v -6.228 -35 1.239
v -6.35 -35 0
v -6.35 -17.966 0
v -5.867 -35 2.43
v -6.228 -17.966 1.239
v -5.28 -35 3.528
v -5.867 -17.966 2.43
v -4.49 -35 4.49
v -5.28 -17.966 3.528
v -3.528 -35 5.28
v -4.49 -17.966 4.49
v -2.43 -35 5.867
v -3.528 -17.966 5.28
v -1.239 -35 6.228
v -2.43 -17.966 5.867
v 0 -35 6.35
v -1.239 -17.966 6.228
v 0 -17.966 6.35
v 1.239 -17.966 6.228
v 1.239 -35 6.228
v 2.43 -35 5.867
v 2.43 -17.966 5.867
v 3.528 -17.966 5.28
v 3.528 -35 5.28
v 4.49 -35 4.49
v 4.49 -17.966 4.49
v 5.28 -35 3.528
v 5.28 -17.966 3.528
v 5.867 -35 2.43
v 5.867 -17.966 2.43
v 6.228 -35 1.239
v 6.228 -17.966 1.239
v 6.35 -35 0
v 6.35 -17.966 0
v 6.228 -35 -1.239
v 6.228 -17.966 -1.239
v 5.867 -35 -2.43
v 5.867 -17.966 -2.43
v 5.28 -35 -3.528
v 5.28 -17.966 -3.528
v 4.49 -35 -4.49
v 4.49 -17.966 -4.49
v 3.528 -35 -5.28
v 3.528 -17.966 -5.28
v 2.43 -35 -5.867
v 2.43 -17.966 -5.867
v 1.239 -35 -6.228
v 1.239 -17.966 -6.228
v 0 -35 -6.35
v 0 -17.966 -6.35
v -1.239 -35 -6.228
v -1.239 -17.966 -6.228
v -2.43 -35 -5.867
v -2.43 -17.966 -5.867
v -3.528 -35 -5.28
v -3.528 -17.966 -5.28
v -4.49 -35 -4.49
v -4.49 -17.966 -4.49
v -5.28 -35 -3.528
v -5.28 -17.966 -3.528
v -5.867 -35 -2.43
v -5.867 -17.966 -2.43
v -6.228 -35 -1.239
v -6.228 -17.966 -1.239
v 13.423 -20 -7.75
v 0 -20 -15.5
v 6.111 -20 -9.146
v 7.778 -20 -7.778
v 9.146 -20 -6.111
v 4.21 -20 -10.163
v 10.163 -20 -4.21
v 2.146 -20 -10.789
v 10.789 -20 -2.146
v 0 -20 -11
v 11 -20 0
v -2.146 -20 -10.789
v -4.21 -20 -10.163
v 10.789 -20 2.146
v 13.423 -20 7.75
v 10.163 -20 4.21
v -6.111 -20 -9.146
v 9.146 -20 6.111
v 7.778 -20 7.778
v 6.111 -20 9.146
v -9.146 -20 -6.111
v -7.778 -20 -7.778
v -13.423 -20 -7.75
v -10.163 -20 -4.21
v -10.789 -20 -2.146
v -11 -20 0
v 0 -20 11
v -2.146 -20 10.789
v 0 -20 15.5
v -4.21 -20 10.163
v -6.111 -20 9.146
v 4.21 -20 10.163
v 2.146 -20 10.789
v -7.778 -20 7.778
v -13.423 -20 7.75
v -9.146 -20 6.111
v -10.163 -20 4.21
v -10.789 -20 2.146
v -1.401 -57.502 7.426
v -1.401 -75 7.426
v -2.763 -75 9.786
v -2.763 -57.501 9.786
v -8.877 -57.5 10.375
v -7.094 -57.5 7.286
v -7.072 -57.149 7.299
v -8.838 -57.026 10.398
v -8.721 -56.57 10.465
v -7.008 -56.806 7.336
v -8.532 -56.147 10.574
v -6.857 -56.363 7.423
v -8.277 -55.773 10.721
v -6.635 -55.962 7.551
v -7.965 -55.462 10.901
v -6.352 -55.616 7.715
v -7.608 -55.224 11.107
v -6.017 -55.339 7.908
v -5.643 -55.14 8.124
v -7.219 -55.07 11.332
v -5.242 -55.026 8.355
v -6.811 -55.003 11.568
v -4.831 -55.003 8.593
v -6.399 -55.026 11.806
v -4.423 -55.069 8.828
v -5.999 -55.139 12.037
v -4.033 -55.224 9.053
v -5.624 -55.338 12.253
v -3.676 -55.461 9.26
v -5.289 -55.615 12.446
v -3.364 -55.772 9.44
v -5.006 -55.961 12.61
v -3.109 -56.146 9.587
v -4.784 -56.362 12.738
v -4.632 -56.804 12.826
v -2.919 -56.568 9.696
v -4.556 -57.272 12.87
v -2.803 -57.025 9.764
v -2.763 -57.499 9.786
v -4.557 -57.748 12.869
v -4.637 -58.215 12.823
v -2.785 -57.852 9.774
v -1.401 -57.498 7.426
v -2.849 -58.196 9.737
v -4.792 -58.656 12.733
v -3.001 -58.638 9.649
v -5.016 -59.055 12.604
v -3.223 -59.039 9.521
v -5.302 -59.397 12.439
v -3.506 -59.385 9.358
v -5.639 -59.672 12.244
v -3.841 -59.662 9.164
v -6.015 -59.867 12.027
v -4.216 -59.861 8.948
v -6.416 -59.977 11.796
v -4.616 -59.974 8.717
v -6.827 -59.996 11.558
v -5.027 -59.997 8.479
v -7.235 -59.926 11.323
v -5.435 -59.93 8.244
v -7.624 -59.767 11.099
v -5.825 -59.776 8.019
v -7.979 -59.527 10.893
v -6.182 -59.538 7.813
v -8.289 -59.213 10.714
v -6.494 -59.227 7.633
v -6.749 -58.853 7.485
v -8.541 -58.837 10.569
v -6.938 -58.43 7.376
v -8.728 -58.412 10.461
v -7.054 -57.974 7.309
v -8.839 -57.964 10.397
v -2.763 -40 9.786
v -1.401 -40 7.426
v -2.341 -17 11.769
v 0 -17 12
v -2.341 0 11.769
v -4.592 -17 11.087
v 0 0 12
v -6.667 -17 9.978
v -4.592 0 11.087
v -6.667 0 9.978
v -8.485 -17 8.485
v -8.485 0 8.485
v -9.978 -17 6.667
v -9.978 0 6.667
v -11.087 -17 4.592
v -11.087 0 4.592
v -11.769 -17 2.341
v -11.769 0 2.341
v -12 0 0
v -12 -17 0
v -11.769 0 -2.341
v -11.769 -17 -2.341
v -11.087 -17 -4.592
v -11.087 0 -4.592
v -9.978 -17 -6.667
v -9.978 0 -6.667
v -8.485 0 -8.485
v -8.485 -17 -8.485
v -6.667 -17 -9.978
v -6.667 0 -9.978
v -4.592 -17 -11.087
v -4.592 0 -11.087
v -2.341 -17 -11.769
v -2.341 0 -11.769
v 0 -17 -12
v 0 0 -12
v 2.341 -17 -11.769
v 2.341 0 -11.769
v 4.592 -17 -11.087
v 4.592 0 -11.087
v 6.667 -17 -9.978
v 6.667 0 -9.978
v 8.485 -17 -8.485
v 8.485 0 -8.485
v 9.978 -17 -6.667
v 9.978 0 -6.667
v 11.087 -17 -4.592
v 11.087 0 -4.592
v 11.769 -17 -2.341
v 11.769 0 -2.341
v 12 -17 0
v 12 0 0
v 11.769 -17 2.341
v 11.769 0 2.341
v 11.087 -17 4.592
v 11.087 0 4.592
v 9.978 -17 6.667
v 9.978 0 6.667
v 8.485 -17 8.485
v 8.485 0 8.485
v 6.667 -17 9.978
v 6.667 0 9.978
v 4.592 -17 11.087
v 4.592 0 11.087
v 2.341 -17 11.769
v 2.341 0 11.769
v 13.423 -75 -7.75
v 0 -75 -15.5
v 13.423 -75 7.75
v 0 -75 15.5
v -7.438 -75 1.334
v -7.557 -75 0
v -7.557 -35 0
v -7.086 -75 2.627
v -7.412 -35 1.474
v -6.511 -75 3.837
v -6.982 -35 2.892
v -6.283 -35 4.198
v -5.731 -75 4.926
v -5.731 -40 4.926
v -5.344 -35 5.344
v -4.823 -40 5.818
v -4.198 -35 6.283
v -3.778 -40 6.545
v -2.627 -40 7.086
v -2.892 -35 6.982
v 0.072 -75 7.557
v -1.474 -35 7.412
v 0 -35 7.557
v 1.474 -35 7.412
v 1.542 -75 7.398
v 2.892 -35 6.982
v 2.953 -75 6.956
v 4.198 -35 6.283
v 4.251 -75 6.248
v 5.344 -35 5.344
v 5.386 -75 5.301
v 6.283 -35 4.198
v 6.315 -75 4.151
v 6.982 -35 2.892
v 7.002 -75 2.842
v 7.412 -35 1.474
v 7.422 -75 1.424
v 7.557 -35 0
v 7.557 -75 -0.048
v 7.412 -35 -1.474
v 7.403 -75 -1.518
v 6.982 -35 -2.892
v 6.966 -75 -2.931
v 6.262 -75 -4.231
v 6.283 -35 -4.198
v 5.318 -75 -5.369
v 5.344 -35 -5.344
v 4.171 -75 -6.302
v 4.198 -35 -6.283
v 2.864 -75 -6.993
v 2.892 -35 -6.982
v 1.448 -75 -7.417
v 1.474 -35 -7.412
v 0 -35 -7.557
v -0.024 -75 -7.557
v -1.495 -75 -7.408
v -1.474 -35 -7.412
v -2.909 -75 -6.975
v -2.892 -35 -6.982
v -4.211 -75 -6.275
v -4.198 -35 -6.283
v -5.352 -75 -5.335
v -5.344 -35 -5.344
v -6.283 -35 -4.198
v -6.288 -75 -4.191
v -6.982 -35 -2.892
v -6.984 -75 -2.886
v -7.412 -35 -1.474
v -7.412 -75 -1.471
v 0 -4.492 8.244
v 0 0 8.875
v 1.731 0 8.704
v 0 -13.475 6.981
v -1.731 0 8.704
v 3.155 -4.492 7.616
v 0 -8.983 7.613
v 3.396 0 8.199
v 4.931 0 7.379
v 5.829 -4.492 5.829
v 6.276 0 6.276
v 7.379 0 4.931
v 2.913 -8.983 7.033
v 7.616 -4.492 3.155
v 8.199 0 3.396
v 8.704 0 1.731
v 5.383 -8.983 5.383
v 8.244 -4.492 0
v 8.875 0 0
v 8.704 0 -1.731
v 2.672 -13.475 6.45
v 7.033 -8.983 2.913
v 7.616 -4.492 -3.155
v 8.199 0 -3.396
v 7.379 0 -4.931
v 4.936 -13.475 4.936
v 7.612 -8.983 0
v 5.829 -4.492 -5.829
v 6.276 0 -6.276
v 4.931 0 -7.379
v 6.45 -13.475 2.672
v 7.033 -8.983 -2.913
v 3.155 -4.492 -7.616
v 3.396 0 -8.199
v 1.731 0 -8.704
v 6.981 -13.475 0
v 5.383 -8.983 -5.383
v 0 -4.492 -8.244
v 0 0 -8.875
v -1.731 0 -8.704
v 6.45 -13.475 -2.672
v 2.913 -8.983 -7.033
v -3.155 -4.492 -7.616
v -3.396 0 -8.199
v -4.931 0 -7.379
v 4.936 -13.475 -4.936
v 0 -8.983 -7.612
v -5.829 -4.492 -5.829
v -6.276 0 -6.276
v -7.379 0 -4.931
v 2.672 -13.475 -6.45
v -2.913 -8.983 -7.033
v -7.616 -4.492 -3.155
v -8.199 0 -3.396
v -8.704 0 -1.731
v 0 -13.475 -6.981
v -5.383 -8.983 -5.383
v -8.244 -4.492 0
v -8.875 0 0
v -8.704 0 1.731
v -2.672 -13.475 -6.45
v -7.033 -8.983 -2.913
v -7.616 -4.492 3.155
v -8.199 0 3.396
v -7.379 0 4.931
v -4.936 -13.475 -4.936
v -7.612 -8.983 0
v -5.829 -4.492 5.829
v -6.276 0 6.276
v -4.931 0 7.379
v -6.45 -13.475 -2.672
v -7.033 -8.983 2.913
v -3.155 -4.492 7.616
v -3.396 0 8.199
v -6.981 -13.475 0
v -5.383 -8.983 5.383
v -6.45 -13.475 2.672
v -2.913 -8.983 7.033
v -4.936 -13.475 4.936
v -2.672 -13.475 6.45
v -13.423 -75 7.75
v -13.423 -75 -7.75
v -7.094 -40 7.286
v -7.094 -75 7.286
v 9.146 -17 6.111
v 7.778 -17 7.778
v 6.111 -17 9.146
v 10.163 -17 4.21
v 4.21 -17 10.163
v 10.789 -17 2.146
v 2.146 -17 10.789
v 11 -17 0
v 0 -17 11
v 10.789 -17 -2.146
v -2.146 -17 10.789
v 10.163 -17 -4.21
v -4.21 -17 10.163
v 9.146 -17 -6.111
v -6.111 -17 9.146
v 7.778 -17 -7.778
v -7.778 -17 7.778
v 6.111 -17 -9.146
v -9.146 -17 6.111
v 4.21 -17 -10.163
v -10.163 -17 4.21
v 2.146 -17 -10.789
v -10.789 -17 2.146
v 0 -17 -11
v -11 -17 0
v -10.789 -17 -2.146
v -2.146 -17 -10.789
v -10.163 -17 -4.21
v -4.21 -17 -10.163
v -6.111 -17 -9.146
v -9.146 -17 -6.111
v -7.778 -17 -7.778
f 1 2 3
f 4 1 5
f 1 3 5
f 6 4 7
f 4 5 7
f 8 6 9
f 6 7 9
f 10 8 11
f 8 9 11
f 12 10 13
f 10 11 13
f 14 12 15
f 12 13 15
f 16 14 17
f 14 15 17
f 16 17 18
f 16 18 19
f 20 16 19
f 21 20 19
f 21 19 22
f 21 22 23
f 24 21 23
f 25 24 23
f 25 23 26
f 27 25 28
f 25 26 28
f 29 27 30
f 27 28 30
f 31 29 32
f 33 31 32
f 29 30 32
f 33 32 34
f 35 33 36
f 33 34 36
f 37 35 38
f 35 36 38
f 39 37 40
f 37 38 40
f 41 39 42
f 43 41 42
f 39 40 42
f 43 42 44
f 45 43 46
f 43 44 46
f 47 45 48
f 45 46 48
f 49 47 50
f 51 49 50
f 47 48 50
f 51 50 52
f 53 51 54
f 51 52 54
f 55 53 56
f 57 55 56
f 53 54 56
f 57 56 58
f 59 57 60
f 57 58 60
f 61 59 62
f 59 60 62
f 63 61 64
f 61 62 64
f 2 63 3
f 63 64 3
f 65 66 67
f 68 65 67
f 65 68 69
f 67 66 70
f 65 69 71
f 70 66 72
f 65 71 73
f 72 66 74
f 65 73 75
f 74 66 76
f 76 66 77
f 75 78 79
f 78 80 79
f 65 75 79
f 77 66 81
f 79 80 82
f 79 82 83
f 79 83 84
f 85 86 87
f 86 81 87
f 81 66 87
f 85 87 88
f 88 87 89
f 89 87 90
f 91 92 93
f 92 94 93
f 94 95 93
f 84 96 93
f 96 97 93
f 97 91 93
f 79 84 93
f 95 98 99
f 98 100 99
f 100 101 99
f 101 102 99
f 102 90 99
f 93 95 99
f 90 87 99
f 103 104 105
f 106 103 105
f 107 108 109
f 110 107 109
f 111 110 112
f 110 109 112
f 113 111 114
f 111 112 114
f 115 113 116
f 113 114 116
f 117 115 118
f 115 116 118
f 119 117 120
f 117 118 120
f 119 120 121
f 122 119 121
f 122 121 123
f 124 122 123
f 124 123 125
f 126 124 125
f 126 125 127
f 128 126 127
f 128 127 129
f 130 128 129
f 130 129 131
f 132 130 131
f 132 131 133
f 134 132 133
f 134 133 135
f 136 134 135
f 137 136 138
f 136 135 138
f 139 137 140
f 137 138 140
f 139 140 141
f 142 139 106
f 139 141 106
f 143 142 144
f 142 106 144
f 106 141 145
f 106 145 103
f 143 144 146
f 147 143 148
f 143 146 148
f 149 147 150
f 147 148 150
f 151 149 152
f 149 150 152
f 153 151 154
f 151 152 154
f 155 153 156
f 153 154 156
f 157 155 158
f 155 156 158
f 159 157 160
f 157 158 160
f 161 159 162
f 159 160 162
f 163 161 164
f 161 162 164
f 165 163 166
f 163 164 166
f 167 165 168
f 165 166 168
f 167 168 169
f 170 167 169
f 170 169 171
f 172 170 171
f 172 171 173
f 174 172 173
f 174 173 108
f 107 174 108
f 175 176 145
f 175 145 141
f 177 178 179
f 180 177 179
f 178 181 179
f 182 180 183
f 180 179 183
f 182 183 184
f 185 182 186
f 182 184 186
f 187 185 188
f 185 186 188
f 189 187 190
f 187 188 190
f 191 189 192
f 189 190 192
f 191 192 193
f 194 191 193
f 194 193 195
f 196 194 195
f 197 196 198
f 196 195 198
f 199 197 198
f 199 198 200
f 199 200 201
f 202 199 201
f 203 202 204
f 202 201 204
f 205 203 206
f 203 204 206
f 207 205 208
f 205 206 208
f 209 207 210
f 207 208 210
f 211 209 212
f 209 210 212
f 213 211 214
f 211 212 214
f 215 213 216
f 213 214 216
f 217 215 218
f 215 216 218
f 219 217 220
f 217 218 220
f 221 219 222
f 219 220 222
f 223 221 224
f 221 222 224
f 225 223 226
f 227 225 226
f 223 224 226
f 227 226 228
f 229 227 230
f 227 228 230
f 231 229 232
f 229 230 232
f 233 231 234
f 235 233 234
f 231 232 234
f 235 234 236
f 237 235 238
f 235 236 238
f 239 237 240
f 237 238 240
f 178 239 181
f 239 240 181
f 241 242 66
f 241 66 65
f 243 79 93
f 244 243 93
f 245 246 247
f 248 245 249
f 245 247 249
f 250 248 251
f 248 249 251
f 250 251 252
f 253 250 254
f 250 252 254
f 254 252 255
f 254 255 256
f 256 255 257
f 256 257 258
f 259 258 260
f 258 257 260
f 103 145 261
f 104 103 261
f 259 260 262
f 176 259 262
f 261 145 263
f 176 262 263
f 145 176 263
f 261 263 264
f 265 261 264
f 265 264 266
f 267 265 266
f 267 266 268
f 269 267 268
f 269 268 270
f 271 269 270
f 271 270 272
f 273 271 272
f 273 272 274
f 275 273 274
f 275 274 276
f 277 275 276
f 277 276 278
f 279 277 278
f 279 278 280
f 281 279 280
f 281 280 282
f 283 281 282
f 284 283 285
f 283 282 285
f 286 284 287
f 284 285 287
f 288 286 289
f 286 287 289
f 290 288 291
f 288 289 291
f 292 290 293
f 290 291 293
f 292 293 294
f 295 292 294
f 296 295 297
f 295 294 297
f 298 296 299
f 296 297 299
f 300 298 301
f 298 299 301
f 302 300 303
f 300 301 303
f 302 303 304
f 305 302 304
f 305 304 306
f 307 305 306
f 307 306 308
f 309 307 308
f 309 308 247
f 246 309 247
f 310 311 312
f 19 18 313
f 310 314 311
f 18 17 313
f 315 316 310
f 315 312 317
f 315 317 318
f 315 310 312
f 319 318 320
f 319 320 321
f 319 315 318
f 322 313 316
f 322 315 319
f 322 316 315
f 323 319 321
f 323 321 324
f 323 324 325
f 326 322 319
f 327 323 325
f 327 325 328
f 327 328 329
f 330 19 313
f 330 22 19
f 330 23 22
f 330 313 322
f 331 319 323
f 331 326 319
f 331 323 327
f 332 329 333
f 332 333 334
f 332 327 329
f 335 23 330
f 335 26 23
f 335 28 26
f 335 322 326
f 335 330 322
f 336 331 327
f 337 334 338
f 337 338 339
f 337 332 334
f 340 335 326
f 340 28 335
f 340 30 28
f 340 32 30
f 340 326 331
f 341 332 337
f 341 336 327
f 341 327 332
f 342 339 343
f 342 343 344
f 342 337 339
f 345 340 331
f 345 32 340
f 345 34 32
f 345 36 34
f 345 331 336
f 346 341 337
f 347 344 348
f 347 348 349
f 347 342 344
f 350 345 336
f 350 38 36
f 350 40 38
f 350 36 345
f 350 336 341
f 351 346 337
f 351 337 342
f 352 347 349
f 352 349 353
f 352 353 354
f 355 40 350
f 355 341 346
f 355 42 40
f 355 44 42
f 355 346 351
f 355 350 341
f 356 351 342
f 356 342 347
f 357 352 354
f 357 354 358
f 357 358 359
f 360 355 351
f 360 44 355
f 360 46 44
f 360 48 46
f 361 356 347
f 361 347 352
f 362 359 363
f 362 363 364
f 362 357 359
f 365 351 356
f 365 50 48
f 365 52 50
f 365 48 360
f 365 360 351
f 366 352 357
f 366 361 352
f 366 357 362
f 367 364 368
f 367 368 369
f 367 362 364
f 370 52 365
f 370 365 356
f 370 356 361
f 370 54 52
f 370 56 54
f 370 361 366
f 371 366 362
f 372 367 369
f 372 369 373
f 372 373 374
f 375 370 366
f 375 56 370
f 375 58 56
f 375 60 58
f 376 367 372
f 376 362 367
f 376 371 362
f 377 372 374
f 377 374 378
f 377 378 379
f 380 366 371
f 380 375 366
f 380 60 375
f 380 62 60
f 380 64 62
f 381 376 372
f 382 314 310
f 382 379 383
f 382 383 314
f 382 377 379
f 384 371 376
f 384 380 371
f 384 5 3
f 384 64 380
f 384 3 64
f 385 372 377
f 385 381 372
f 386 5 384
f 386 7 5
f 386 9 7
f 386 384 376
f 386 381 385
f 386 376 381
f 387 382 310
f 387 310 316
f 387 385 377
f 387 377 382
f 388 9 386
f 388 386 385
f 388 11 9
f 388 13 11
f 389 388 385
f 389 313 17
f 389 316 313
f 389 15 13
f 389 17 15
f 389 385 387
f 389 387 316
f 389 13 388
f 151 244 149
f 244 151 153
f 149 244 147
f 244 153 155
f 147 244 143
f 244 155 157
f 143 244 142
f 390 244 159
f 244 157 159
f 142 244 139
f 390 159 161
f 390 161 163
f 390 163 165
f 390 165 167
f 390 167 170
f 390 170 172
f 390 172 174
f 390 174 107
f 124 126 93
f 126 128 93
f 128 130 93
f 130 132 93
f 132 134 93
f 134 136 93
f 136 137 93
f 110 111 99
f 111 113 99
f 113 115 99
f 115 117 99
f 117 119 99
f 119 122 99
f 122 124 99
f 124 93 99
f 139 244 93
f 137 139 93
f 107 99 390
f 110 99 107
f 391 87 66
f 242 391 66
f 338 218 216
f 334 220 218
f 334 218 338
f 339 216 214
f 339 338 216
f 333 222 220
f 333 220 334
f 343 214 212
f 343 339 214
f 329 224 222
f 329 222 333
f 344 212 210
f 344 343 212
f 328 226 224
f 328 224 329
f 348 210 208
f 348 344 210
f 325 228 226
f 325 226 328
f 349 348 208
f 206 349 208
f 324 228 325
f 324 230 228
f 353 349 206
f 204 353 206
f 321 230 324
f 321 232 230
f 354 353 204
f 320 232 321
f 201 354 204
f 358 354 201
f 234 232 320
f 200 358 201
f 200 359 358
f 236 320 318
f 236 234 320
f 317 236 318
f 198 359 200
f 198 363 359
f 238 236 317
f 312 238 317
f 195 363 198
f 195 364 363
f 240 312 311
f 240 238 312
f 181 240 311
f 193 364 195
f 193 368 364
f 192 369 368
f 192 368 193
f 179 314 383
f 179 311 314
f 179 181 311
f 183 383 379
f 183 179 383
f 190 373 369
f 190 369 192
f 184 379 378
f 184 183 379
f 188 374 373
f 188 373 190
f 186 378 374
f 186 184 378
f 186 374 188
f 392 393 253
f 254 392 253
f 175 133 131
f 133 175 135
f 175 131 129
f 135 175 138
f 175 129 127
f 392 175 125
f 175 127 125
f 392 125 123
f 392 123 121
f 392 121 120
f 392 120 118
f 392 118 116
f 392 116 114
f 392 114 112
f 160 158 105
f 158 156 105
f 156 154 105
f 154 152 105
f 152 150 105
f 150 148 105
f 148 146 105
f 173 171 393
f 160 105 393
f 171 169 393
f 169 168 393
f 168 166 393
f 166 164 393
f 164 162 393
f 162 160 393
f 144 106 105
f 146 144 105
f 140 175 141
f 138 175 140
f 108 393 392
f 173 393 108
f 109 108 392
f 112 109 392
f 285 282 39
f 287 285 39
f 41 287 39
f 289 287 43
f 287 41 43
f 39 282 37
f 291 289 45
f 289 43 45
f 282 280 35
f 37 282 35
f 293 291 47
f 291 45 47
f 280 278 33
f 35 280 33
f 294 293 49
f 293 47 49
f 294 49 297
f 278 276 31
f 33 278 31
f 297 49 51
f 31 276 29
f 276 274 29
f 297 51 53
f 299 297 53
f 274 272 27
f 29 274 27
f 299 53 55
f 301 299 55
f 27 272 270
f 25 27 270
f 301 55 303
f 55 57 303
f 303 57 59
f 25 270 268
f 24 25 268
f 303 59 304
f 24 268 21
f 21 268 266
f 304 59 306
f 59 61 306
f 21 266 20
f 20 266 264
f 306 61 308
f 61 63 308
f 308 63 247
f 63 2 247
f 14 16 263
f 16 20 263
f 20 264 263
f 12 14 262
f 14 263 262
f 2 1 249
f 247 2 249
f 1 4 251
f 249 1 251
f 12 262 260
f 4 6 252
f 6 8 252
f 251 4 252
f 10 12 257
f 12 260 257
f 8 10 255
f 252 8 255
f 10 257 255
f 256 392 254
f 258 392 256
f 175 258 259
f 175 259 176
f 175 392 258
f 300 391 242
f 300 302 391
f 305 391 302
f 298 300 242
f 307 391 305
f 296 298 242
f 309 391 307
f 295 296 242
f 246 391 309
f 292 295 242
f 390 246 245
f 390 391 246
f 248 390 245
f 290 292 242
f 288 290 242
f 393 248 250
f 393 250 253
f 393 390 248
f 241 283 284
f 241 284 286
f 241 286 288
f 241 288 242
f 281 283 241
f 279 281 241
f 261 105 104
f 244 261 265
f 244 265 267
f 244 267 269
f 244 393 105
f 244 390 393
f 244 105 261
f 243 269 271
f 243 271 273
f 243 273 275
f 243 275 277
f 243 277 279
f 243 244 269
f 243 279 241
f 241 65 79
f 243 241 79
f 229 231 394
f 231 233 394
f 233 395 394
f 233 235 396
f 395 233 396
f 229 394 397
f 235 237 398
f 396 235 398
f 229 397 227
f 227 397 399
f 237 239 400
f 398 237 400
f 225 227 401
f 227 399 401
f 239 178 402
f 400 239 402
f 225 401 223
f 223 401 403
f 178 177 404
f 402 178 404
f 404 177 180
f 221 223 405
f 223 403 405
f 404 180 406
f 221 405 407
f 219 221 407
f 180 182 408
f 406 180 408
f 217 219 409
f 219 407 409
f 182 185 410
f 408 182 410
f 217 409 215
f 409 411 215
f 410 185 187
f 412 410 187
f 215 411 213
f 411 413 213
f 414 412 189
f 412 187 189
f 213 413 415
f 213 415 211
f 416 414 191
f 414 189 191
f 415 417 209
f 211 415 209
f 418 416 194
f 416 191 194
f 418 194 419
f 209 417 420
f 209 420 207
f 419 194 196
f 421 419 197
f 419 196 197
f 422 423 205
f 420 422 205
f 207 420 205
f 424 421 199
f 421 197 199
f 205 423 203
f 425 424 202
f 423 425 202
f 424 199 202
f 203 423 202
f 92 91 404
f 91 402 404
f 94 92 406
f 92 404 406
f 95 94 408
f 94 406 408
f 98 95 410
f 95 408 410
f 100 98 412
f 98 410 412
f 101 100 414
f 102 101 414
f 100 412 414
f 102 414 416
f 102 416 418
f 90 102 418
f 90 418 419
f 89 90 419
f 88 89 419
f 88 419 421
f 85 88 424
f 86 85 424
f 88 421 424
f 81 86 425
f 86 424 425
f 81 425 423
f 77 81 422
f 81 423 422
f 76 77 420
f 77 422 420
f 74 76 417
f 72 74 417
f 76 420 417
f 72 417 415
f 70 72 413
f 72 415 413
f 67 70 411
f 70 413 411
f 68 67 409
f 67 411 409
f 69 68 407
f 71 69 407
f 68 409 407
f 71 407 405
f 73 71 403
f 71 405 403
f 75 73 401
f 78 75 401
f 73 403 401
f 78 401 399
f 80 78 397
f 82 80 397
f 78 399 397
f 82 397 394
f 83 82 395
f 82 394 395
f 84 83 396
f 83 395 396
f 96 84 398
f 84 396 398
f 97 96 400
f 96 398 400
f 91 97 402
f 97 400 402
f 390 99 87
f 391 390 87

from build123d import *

# Parameters (mm, degrees)
F0_R      = 15.5
F1_DEPTH  = 75
F4_R      = 25.113735
F5_DEPTH  = 55.001
F6_R      = 7.557
F7_DEPTH  = 75.001
F9_DEPTH  = 35
F10_R     = 7.557
F10_R_2   = 6.35
F11_DEPTH = 35
F13_D     = 5
F13_DEPTH = 15


with BuildPart() as f1:
    # F0 (on Front) → F1 (new body)
    with BuildSketch(Plane.XZ):
        Circle(F0_R)
    extrude(amount=F1_DEPTH)

    # F2 (on Right) → F3 (revolve, cut)
    with BuildSketch(Plane.YZ):
        Polygon((-17, 12), (0, 12), (0, 15.5), (-20, 15.5), (-20, 11), (-17, 11), align=None)
    revolve(axis=Axis((0, -40.473823, 0), (0, -1, 0)), mode=Mode.SUBTRACT)

    # F4 (on face) → F5 (cut, through all)
    with BuildSketch(Plane(origin=(0, -20, 0), x_dir=(-1, 0, 0), z_dir=(0, 1, 0))):
        Circle(F4_R)
        Polygon((-13.423394, 7.75), (0, 15.5), (13.423394, 7.75), (13.423394, -7.75), (0, -15.5), (-13.423394, -7.75), align=None, mode=Mode.SUBTRACT)
    extrude(amount=-F5_DEPTH, mode=Mode.SUBTRACT)

    # F6 (on face) → F7 (cut, through all)
    with BuildSketch(Plane(origin=(0, 0, 0), x_dir=(-1, 0, 0), z_dir=(0, 1, 0))):
        Circle(F6_R)
    extrude(amount=-F7_DEPTH, mode=Mode.SUBTRACT)

    # F8 (on face) → F9 (cut)
    with BuildSketch(Plane.XZ.offset(75)):
        Polygon((-0.463436, 5.802696), (-2.763436, 9.786412), (-7.093564, 7.286412), (-4.793564, 3.302696), align=None)
    extrude(amount=-F9_DEPTH, mode=Mode.SUBTRACT)

    # F10 (on face) → F11 (join)
    with BuildSketch(Plane(origin=(0, 0, 0), x_dir=(-1, 0, 0), z_dir=(0, 1, 0))):
        Circle(F10_R)
        Circle(F10_R_2, mode=Mode.SUBTRACT)
    extrude(amount=-F11_DEPTH)

    # F13
    with Locations(Plane(origin=(-6.711697, 0, 11.625), x_dir=(0.866025, 0, 0.5), z_dir=(-0.5, 0, 0.866025))):
        with Locations((0, -57.5)):
            Hole(F13_D / 2, depth=F13_DEPTH)

    # F14 (on Right) → F15 (revolve, cut)
    with BuildSketch(Plane.YZ):
        Polygon((-20, 0), (0, 0), (0, 8.875), (-20, 6.064183), align=None)
    revolve(axis=Axis((0, -10, 0), (0, 1, 0)), mode=Mode.SUBTRACT)


solid = f1.part
